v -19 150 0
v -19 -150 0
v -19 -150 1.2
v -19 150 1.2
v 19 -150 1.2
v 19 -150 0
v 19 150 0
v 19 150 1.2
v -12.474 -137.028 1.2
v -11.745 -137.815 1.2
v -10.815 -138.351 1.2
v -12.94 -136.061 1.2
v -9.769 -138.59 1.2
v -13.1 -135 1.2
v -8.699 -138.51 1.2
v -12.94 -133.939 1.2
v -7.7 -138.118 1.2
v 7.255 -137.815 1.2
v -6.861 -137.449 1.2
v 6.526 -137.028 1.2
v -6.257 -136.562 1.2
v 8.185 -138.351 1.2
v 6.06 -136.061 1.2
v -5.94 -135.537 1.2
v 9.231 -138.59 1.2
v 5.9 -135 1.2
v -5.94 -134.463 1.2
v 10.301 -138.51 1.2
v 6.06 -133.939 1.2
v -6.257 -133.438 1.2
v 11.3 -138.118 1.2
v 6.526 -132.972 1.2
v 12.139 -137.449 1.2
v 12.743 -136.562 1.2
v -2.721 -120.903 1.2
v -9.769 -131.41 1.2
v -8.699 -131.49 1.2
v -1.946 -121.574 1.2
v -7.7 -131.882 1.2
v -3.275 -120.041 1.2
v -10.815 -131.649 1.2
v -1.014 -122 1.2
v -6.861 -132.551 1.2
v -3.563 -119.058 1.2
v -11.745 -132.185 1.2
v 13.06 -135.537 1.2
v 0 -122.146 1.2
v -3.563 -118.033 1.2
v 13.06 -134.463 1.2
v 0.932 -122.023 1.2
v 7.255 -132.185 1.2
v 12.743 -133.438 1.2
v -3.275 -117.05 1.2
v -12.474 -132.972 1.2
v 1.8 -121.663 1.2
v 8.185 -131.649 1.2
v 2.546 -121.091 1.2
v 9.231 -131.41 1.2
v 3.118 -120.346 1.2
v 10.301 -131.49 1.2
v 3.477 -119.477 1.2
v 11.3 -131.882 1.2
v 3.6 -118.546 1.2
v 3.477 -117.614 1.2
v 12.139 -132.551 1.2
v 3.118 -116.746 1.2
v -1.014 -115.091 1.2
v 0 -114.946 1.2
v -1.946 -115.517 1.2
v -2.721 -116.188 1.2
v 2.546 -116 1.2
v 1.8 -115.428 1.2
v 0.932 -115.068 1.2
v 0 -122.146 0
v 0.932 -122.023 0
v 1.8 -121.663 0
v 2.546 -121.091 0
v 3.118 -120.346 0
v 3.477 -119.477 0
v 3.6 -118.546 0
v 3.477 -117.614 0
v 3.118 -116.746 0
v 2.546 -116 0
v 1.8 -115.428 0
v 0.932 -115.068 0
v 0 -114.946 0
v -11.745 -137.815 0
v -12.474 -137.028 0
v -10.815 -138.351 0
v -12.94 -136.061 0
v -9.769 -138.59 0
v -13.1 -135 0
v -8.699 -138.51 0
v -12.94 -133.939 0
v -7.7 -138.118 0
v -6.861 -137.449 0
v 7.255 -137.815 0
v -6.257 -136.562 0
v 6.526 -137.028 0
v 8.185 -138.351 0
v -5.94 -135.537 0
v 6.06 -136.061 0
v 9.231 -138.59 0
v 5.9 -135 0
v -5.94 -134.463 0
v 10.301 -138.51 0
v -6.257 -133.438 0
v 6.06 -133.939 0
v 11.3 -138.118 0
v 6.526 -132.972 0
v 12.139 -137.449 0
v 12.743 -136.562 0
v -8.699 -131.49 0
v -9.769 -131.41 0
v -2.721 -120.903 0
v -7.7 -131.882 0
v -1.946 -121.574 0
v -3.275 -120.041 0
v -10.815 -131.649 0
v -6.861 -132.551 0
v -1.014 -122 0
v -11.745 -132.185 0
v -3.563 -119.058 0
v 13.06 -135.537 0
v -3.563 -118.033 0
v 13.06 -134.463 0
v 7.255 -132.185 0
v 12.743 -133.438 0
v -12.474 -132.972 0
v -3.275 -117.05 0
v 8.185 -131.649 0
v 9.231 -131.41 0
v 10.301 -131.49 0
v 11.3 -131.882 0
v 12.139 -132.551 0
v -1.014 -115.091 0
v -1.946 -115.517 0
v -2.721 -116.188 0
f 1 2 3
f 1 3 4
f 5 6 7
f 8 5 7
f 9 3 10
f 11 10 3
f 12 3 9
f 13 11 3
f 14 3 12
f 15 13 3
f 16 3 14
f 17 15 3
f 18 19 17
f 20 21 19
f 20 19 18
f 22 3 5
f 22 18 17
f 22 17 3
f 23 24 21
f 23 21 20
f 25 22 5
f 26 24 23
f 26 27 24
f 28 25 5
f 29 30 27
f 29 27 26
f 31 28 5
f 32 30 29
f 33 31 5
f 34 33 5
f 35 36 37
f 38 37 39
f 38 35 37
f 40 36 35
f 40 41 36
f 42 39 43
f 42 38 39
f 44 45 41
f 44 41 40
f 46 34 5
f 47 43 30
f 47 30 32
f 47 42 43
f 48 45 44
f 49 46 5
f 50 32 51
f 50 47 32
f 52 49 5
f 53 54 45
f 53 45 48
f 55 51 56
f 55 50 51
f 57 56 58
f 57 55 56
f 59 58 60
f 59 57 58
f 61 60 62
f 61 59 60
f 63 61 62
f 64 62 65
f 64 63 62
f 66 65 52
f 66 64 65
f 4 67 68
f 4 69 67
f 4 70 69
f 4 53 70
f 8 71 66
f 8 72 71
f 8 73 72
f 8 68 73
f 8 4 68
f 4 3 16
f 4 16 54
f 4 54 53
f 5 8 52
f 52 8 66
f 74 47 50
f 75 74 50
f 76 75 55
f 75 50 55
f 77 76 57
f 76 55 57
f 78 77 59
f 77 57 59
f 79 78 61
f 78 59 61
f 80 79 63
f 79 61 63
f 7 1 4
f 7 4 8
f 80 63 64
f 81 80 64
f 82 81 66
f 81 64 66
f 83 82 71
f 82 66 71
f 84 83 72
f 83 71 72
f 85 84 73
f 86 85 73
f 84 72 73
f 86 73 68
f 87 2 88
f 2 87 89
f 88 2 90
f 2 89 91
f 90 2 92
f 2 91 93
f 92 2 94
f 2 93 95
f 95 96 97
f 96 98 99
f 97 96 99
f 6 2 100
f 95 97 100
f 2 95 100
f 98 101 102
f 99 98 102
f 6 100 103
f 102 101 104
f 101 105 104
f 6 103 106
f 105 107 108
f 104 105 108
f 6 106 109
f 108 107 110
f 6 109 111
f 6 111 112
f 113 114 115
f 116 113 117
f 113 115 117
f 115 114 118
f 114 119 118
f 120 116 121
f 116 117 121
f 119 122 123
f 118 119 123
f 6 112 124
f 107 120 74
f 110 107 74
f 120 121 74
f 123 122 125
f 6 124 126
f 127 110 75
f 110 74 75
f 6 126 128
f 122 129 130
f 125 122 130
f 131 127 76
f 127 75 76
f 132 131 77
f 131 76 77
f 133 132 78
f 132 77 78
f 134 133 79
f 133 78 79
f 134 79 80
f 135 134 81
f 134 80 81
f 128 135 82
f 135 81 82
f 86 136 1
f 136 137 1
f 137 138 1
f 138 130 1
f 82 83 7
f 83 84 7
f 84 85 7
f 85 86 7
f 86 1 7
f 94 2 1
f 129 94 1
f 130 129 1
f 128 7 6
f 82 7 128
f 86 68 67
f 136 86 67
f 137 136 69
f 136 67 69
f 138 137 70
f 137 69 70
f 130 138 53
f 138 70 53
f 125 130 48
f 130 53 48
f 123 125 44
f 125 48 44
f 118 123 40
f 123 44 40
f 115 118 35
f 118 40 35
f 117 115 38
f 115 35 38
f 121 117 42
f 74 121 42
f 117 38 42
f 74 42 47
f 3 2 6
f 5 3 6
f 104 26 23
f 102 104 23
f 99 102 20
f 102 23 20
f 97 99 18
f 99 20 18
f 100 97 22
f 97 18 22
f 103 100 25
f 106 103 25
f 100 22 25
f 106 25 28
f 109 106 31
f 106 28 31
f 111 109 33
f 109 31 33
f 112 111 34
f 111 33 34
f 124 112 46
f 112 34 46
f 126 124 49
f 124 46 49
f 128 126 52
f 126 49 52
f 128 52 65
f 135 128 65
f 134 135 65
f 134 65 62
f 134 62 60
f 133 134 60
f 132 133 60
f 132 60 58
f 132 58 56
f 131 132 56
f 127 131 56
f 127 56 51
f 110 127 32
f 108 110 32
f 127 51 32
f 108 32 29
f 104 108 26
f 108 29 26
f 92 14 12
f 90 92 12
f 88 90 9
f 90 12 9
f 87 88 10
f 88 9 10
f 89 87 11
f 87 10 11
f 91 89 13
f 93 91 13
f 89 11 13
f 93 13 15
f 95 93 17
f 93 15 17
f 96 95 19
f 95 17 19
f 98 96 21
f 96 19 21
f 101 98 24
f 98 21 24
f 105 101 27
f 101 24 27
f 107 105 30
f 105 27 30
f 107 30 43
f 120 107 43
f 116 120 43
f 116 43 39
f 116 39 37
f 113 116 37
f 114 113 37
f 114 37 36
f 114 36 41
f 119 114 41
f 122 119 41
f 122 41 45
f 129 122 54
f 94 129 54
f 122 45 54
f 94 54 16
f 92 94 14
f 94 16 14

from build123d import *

# Parameters (mm, degrees)
SKETCH_1_W          = 38
SKETCH_1_H          = 300
EXTRUDE_1_DEPTH     = 1.2
CUT_EXTRUDE_1_DEPTH = 1.2


with BuildPart() as part:
    # Эскиз1 → Бобышка-Вытянуть1 (new body)
    with BuildSketch(Plane.XY):
        Rectangle(SKETCH_1_W, SKETCH_1_H)
    extrude(amount=EXTRUDE_1_DEPTH)

    # Эскиз2 → Вырез-Вытянуть1 (cut)
    with BuildSketch(Plane.XY.offset(1.2)):
        with BuildLine():
            ThreePointArc((0, -114.945517328), (-3.6, -118.545517328), (0, -122.145517328))
            Line((0, -122.145517328), (0, -114.945517328))
        make_face()
        with BuildLine():
            Line((0, -114.945517328), (0, -122.145517328))
            ThreePointArc((0, -122.145517328), (2.545584412, -121.09110174), (3.6, -118.545517328))
            ThreePointArc((3.6, -118.545517328), (2.545584412, -115.999932916), (0, -114.945517328))
        make_face()
        with BuildLine():
            ThreePointArc((-5.9, -135), (-9.5, -131.4), (-13.1, -135))
            Line((-13.1, -135), (-5.9, -135))
        make_face()
        with BuildLine():
            Line((-5.9, -135), (-13.1, -135))
            ThreePointArc((-13.1, -135), (-9.5, -138.6), (-5.9, -135))
        make_face()
        with BuildLine():
            ThreePointArc((13.1, -135), (9.5, -131.4), (5.9, -135))
            Line((5.9, -135), (13.1, -135))
        make_face()
        with BuildLine():
            Line((13.1, -135), (5.9, -135))
            ThreePointArc((5.9, -135), (9.5, -138.6), (13.1, -135))
        make_face()
    extrude(amount=-CUT_EXTRUDE_1_DEPTH, mode=Mode.SUBTRACT)


solid = part.part
